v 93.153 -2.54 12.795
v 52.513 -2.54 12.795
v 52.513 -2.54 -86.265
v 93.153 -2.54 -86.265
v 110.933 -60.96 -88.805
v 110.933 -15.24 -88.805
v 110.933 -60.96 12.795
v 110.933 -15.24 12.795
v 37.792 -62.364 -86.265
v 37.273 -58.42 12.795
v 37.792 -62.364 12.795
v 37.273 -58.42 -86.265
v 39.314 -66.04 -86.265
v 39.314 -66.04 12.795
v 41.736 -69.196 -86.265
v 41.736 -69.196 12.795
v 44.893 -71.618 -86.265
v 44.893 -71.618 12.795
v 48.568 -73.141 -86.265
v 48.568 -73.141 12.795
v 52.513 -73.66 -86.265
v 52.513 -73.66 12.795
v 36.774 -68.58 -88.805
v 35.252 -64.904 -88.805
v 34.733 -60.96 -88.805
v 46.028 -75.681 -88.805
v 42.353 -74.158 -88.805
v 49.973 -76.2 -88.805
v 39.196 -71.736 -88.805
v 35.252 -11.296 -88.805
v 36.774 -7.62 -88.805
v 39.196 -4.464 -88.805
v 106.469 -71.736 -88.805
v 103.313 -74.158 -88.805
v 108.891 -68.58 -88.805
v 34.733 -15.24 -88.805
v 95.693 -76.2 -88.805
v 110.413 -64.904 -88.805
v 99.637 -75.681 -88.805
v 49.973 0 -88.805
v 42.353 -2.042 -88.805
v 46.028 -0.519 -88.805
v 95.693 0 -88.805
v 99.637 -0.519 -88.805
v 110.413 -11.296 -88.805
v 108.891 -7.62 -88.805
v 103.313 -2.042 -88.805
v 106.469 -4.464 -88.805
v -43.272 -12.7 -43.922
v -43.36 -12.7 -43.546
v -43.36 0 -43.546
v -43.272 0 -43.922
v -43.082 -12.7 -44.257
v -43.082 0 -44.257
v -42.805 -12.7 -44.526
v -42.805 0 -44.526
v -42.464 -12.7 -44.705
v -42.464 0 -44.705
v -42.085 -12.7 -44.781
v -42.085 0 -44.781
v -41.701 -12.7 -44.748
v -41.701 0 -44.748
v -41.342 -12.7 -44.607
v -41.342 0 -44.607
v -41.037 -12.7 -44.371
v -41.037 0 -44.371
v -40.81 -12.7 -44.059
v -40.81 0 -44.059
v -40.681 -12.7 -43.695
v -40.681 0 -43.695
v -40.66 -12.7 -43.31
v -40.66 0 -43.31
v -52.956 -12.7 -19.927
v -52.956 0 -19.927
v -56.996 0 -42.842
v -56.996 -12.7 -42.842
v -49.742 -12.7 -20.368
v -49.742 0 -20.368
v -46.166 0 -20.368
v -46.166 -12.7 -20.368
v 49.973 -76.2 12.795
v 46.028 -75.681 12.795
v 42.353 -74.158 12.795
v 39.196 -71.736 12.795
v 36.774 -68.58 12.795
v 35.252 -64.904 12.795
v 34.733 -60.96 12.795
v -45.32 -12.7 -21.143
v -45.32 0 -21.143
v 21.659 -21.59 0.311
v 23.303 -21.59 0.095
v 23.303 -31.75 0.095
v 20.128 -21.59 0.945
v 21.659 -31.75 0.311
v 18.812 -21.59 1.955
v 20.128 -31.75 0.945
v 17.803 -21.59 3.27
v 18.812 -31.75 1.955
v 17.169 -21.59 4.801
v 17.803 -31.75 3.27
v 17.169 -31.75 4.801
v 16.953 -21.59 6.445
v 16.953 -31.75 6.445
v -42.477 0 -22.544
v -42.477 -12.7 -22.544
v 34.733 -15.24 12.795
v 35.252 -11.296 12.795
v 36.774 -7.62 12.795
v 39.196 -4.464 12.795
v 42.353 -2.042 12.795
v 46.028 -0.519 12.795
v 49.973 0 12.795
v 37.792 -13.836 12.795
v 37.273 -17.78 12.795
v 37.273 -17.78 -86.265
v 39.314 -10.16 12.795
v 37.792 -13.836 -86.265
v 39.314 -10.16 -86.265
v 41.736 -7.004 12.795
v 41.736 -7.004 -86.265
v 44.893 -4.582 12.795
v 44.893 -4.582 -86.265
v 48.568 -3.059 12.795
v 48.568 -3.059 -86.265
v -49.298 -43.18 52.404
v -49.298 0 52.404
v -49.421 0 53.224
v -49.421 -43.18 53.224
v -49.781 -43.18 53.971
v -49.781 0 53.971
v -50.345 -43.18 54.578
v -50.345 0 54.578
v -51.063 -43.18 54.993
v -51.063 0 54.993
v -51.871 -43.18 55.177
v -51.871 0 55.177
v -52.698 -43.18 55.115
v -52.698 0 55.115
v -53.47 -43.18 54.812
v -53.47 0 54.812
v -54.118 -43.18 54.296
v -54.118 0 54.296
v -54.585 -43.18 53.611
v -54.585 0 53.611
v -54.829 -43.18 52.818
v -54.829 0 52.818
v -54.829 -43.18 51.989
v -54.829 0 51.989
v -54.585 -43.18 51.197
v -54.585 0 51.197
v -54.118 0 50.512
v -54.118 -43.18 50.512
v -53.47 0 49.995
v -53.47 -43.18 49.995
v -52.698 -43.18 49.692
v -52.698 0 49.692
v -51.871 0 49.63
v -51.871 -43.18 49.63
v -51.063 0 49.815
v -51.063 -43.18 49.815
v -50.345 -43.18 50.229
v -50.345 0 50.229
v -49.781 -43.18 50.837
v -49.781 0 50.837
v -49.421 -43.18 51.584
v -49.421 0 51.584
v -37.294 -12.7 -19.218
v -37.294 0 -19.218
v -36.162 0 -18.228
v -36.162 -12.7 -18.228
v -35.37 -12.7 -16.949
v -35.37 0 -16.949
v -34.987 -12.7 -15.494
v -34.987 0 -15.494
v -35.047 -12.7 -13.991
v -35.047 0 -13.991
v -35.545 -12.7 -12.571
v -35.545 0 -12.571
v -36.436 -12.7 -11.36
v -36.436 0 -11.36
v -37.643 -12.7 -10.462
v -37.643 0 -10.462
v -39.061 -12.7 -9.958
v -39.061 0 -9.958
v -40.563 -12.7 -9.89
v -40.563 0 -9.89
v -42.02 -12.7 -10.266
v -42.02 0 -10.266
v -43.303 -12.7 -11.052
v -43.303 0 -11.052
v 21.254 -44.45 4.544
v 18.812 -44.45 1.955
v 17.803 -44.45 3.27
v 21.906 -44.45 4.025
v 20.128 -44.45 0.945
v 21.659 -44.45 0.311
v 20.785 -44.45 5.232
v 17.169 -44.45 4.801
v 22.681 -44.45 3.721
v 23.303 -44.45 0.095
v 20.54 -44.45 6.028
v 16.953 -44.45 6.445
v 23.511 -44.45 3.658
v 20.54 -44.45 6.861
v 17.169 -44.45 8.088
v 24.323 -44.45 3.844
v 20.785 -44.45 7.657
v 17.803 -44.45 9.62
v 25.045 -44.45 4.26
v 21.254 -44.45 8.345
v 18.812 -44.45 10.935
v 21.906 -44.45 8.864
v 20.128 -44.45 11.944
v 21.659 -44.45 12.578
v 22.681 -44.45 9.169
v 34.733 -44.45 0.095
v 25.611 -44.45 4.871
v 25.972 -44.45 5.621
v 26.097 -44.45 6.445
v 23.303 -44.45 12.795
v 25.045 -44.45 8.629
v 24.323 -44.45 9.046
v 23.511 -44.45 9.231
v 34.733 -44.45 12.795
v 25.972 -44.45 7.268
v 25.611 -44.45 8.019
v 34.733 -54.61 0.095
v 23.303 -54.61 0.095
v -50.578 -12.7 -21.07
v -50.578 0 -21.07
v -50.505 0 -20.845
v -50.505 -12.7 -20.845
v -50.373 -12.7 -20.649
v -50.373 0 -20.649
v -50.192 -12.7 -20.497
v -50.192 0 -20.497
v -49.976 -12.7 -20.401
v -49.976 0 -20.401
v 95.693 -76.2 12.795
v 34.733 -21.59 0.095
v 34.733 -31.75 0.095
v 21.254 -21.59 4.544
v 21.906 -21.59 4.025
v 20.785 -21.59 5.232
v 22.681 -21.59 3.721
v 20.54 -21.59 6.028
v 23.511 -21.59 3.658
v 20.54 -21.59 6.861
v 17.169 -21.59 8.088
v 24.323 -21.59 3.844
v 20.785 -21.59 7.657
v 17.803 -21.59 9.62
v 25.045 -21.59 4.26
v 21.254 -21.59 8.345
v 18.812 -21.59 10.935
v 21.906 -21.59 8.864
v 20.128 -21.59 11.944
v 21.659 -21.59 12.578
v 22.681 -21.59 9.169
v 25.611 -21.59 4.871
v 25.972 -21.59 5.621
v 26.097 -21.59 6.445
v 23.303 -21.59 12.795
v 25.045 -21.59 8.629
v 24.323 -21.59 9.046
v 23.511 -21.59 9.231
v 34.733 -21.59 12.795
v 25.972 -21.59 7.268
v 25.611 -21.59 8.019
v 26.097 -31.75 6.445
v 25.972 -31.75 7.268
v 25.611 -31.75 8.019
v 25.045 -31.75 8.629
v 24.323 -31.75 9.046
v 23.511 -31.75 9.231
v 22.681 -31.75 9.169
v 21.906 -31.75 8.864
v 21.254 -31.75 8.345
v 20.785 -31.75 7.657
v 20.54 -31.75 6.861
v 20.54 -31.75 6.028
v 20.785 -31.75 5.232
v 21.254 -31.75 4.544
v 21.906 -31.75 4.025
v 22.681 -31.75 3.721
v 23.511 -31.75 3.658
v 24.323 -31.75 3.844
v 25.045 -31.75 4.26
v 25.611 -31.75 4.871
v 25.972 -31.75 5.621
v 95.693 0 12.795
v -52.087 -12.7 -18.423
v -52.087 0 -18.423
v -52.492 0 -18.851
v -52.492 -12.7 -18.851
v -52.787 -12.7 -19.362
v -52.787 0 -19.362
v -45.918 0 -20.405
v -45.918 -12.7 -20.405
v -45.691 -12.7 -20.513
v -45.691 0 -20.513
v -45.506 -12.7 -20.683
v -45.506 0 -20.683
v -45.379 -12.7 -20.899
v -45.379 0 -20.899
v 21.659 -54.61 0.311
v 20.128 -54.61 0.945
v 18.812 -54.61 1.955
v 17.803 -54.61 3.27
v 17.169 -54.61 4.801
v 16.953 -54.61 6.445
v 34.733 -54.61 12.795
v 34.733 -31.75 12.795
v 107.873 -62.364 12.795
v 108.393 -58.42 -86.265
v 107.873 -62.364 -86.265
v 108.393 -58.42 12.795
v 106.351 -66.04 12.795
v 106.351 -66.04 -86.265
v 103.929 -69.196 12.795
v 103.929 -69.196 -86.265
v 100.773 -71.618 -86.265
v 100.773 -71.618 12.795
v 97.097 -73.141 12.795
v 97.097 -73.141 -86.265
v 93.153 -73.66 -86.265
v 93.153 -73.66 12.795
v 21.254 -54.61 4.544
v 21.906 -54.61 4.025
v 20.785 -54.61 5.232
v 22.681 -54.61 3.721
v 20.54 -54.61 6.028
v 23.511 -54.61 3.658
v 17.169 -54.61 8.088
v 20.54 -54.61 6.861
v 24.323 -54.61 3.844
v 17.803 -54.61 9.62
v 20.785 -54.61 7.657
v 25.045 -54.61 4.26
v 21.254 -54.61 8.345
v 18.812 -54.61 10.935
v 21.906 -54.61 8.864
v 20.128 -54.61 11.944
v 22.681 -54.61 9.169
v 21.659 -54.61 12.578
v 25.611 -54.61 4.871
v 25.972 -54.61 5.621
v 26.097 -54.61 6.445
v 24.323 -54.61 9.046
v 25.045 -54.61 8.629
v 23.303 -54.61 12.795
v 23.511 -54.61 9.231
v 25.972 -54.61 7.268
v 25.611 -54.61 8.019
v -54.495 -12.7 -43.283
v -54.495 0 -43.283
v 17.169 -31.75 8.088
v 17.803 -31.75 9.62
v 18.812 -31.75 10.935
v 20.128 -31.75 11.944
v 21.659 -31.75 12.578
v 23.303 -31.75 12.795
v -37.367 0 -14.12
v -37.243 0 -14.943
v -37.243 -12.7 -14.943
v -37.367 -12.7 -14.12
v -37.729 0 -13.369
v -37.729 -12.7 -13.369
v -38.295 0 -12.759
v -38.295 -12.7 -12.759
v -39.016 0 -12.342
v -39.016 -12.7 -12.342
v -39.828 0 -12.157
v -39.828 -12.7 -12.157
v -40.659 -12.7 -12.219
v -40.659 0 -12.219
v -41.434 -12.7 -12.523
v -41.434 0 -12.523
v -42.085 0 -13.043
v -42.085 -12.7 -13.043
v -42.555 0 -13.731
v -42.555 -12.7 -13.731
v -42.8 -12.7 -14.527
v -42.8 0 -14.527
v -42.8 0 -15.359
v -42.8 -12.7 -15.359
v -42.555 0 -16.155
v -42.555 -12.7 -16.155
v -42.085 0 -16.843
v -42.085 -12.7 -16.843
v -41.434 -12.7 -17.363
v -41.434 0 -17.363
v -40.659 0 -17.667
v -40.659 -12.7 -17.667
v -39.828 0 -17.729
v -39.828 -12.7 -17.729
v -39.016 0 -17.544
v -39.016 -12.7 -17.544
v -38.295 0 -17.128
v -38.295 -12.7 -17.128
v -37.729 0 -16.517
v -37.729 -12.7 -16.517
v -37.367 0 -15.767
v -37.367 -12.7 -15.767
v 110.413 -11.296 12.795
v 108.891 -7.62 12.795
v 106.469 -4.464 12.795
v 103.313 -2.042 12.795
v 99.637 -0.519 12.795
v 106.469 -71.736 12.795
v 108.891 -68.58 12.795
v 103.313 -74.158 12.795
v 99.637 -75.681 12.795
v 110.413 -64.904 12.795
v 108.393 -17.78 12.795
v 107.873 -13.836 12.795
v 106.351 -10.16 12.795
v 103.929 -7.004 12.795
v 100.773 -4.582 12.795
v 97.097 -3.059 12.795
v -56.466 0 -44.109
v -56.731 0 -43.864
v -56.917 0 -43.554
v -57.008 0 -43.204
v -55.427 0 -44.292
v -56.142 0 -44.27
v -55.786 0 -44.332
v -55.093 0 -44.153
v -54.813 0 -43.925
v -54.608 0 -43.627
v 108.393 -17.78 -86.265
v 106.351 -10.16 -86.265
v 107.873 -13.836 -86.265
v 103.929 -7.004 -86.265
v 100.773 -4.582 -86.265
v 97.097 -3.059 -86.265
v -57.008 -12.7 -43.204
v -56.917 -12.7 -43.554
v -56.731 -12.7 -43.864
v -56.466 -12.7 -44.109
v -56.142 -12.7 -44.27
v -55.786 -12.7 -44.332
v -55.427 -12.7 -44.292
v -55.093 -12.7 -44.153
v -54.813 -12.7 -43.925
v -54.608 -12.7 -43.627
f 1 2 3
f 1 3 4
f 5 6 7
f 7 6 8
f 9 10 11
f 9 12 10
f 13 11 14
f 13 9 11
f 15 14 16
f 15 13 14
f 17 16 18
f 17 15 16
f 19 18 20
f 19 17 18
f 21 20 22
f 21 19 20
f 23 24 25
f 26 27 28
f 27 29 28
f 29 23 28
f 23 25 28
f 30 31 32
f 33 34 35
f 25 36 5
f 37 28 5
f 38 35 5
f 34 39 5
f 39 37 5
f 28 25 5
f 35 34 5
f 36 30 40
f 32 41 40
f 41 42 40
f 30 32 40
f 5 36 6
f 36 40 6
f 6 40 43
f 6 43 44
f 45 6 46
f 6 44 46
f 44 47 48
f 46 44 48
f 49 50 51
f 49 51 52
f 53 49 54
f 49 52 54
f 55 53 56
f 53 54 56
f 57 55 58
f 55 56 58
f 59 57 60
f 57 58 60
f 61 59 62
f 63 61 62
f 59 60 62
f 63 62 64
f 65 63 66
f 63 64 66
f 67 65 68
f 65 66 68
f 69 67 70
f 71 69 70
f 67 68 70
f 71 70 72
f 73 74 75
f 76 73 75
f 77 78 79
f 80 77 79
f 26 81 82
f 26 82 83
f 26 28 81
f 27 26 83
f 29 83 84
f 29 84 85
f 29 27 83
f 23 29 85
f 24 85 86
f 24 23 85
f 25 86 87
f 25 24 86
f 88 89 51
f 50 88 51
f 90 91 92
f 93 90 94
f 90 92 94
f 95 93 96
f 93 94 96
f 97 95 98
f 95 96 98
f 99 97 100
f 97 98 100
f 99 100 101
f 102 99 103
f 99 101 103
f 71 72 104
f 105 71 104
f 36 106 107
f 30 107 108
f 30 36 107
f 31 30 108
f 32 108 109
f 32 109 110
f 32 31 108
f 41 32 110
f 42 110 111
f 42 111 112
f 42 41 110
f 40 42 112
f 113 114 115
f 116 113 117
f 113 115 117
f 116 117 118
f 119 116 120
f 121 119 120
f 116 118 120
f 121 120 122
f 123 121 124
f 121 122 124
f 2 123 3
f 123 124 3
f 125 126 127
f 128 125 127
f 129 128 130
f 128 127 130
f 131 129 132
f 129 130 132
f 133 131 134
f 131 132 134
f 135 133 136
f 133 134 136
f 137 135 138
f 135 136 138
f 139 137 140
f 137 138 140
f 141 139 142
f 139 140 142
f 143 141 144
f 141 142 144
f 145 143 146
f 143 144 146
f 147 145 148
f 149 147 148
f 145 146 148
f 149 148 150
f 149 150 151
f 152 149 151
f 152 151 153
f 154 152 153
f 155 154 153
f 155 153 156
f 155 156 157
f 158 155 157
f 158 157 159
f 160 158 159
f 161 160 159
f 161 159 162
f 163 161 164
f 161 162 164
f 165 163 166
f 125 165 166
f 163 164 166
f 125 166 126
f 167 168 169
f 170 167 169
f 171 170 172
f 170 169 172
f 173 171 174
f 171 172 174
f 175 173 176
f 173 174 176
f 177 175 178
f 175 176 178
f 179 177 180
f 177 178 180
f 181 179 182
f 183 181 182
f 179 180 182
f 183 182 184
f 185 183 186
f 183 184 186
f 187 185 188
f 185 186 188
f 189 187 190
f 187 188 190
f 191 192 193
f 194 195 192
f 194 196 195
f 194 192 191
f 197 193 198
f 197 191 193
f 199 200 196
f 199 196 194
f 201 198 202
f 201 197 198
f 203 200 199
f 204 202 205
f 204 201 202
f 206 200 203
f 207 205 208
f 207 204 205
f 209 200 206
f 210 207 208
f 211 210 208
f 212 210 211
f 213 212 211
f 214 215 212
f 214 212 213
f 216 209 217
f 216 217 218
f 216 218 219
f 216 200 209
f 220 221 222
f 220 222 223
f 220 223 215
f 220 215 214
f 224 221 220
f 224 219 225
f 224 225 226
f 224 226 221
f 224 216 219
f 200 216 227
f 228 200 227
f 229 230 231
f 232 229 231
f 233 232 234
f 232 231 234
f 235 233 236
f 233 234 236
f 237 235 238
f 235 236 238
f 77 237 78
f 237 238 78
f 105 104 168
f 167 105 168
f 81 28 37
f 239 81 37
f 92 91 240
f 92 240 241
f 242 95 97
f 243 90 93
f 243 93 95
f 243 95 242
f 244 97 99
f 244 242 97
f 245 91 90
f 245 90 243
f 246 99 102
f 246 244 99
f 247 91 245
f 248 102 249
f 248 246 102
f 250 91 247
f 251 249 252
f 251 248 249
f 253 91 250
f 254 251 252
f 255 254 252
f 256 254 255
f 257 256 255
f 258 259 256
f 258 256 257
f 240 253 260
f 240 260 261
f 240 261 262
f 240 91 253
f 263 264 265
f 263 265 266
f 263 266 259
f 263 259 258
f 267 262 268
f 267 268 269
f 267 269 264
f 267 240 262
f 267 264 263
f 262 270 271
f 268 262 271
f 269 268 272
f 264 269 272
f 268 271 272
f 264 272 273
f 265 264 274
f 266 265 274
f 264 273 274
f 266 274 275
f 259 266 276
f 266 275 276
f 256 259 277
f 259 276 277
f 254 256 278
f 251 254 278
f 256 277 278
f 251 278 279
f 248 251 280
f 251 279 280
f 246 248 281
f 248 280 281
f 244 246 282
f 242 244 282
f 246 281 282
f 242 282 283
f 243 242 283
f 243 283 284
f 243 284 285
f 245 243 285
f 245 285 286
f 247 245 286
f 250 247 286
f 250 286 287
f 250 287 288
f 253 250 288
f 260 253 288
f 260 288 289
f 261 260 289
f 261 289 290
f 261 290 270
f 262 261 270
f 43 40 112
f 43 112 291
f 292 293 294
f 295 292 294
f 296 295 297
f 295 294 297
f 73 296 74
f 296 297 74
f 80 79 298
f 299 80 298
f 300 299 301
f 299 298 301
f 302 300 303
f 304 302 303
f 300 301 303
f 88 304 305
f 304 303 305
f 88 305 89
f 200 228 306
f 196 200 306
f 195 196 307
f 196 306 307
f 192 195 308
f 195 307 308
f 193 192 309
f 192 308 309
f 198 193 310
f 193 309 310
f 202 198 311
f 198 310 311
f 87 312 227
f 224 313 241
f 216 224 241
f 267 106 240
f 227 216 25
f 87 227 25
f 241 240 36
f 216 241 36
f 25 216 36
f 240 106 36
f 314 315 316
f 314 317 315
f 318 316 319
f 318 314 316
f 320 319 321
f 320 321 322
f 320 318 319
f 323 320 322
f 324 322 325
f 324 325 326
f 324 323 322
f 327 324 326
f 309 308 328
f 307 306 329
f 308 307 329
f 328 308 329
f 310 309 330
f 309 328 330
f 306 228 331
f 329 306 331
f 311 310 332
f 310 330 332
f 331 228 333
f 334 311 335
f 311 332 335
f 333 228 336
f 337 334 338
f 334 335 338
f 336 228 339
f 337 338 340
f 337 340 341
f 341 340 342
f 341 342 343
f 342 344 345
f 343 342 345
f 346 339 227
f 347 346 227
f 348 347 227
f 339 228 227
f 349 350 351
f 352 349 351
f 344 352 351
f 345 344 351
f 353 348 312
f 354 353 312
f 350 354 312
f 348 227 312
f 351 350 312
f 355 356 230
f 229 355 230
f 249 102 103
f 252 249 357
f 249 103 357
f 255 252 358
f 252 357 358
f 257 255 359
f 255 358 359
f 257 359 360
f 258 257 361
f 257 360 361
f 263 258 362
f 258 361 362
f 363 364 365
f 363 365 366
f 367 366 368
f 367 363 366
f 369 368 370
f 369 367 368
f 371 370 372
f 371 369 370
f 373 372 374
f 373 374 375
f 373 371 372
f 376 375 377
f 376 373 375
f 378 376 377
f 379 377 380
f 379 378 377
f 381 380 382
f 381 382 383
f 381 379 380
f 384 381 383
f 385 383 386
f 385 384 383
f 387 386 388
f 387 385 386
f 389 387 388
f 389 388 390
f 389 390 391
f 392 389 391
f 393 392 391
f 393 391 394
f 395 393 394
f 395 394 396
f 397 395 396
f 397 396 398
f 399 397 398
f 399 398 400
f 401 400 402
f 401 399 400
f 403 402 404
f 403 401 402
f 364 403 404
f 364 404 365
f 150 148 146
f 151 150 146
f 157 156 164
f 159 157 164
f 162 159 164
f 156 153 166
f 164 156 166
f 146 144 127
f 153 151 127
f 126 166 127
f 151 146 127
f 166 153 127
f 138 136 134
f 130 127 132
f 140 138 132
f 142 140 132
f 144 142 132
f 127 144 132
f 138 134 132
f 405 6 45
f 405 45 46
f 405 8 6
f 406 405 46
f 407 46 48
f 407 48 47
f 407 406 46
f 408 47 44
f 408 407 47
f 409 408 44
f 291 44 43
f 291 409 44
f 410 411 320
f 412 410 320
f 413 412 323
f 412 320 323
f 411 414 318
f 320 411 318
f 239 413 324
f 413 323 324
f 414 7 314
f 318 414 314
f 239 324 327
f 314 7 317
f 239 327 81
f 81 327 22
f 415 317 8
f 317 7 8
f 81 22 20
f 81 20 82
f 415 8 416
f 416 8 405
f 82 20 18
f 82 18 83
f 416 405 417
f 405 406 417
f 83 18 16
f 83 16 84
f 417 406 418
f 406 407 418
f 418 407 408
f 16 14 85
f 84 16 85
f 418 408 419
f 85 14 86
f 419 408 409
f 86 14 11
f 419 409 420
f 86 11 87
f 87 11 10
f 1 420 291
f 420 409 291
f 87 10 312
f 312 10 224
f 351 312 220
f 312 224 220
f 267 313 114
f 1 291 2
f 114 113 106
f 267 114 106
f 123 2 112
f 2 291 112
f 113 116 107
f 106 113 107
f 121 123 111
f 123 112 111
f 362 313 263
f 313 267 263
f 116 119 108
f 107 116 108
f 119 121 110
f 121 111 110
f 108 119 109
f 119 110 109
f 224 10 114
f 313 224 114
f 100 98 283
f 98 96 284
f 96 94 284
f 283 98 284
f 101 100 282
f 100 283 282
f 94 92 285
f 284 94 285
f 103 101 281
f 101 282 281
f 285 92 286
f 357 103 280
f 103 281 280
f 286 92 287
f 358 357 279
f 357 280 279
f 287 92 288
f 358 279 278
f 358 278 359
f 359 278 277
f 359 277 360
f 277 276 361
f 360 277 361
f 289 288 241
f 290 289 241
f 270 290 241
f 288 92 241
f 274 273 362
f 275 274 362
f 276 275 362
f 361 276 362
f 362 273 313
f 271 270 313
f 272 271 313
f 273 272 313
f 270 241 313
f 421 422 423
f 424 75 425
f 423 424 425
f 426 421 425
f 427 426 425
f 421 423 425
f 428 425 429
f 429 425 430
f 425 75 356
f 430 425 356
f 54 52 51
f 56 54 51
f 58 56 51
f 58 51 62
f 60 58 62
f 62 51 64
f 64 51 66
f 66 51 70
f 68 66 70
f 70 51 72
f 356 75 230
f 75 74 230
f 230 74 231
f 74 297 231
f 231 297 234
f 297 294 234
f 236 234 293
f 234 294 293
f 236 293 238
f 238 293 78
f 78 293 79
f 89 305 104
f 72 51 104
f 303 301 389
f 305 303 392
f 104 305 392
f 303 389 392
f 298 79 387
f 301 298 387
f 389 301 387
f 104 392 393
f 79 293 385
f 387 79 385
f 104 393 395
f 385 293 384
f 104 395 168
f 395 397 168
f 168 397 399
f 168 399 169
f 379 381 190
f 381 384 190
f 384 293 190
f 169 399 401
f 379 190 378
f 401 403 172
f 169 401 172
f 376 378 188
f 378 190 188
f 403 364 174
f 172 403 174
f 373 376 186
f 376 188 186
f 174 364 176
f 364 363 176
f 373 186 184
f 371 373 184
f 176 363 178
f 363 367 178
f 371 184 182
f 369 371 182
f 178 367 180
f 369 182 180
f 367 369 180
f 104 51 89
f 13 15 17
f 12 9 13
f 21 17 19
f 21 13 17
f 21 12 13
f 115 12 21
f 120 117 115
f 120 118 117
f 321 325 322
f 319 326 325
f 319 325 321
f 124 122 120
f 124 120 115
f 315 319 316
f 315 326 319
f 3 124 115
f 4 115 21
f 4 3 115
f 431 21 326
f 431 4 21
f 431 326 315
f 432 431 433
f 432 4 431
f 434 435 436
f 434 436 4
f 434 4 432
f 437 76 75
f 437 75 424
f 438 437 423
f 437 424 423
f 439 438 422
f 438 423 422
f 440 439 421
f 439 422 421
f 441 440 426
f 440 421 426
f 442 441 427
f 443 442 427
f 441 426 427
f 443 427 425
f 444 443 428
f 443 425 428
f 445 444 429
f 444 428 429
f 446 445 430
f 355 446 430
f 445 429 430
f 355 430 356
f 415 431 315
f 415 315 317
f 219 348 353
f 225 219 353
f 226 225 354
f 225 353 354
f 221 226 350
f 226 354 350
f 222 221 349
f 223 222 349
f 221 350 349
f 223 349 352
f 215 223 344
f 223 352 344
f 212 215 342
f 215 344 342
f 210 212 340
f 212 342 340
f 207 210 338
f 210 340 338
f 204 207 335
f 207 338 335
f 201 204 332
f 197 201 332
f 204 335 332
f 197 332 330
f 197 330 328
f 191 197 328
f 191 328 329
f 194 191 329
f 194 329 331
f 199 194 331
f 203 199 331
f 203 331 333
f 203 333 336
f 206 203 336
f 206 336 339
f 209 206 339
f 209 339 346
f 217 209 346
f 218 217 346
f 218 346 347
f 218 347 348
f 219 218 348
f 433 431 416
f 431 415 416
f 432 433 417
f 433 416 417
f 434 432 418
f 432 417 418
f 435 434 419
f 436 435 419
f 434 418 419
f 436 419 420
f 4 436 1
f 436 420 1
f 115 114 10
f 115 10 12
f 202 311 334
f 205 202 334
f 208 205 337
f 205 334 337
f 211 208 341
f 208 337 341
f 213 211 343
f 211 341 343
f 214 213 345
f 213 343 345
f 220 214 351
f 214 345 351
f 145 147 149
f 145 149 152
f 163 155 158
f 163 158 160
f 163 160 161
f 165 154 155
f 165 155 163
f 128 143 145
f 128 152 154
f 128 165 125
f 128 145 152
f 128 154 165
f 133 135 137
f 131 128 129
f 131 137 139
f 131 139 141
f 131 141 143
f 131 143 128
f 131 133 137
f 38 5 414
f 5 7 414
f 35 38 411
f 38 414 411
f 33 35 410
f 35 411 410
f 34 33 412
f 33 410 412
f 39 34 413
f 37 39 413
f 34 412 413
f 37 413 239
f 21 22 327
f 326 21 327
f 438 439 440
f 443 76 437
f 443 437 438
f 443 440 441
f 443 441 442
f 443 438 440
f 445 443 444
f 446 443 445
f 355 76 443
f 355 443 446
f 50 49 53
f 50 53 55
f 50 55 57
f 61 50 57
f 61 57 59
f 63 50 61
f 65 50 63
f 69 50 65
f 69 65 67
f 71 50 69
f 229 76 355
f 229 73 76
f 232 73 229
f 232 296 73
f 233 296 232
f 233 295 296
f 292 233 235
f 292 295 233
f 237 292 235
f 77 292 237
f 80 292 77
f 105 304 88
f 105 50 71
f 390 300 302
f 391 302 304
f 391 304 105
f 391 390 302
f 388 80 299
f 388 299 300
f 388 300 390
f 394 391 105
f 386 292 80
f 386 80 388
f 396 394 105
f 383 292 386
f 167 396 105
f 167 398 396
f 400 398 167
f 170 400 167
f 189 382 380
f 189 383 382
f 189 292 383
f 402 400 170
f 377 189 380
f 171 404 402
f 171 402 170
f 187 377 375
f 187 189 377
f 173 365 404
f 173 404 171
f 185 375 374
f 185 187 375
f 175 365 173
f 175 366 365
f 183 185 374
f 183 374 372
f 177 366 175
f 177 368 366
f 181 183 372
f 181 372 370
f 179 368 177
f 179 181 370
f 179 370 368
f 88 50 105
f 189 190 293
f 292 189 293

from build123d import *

# Parameters (mm, degrees)
F0_R      = 2.794
F1_DEPTH  = 12.7
F3_DEPTH  = 76.2
F4_T      = -2.54
F5_R      = 15.24
F6_R      = 15.24
F7_W      = 10.16
F7_H      = 12.7
F8_DEPTH  = 17.78
F10_DEPTH = 33.02
F9_R      = 2.794
F11_DEPTH = 33.02
F12_R     = 2.7813
F13_DEPTH = 43.18


with BuildPart() as f1:
    # F0 (on Front) → F1 (new body)
    with BuildSketch(Plane.XZ):
        with BuildLine():
            Line((-52.9557178239, -19.9272039703), (-56.9962829072, -42.842387268))
            ThreePointArc((-56.9962829072, -42.842387268), (-55.9661104361, -44.3136260292), (-54.4948716749, -43.2834535581))
            Line((-54.4948716749, -43.2834535581), (-50.5779905068, -21.0697165999))
            ThreePointArc((-50.5779905068, -21.0697165999), (-50.2876675436, -20.566862477), (-49.7420388513, -20.3682698741))
            Line((-49.7420388513, -20.3682698741), (-46.1659254268, -20.3682698741))
            ThreePointArc((-46.1659254268, -20.3682698741), (-45.5924523294, -20.5912813649), (-45.3203079908, -21.143135492))
            Line((-45.3203079908, -21.143135492), (-43.3602964284, -43.546170164))
            ThreePointArc((-43.3602964284, -43.546170164), (-41.8919443993, -44.7782638101), (-40.6598507532, -43.309911781))
            Line((-40.6598507532, -43.309911781), (-42.4765913108, -22.5444721875))
            Line((-42.4765913108, -22.5444721875), (-37.2936406402, -19.2184539172))
            ThreePointArc((-37.2936406402, -19.2184539172), (-35.9454842194, -11.9324491853), (-43.3026181586, -11.0515570864))
            Line((-43.3026181586, -11.0515570864), (-52.0869866599, -18.422517456))
            ThreePointArc((-52.0869866599, -18.422517456), (-52.6540106569, -19.0982703415), (-52.9557178239, -19.9272039703))
        make_face()
        with Locations((-40.0372571014, -14.9430628575)):
            Circle(F0_R, mode=Mode.SUBTRACT)
    extrude(amount=F1_DEPTH)


with BuildPart() as f3:
    # F2 (on Front) → F3 (new body)
    with BuildSketch(Plane.XZ):
        Polygon((34.7325472392, 7.2066777061), (34.7325472392, -88.8053222939), (110.9325472392, -88.8053222939), (110.9325472392, 12.7946777061), (34.7325472392, 12.7946777061), align=None)
    extrude(amount=F3_DEPTH)

    # F4
    f4_openings = [f3.faces().sort_by_distance(p)[0] for p in [
        (72.832547, -38.1, 12.794678),
    ]]
    offset(amount=F4_T, openings=f4_openings)

    # F5
    f5_edges = [f3.edges().sort_by_distance(p)[0] for p in [
        (37.272547, -2.54, -36.735322),
        (108.392547, -2.54, -36.735322),
        (37.272547, -73.66, -36.735322),
        (108.392547, -73.66, -36.735322),
    ]]
    fillet(f5_edges, radius=F5_R)

    # F6
    f6_edges = [f3.edges().sort_by_distance(p)[0] for p in [
        (110.932547, 0, -38.005322),
        (110.932547, -76.2, -38.005322),
        (34.732547, 0, -38.005322),
        (34.732547, -76.2, -38.005322),
    ]]
    fillet(f6_edges, radius=F6_R)

    # F7 (on face) → F8 (join)
    with BuildSketch(Plane(origin=(34.7325472392, 0, 0), x_dir=(0, -1, 0), z_dir=(-1, 0, 0))):
        with Locations((26.67, 6.4446777061)):
            Rectangle(F7_W, F7_H)
        with Locations((49.53, 6.4446777061)):
            Rectangle(F7_W, F7_H)
    extrude(amount=F8_DEPTH)

    # F9 (on face) → F10 (cut)
    with BuildSketch(Plane.XZ.offset(54.61)):
        with BuildLine():
            Line((16.9525472392, 0.0946777061), (23.3025472392, 0.0946777061))
            ThreePointArc((23.3025472392, 0.0946777061), (18.8124192105, 1.9545496137), (16.9525472392, 6.444677616))
            Line((16.9525472392, 6.444677616), (16.9525472392, 0.0946777061))
        make_face()
        with BuildLine():
            ThreePointArc((16.9525472392, 6.444677616), (18.8124191468, 10.9348057347), (23.3025472392, 12.7946777061))
            Line((23.3025472392, 12.7946777061), (16.9525472392, 12.7946777061))
            Line((16.9525472392, 12.7946777061), (16.9525472392, 6.444677616))
        make_face()
    extrude(amount=-F10_DEPTH, mode=Mode.SUBTRACT)

    # F9 (on face) → F11 (cut)
    with BuildSketch(Plane.XZ.offset(54.61)):
        with Locations((23.3025472392, 6.4446777061)):
            Circle(F9_R)
    extrude(amount=-F11_DEPTH, mode=Mode.SUBTRACT)


with BuildPart() as f13:
    # F12 (on Front) → F13 (new body)
    with BuildSketch(Plane.XZ):
        with Locations((-52.0791523159, 52.403781563)):
            Circle(F12_R)
    extrude(amount=F13_DEPTH)


solid = Compound([f1.part, f3.part, f13.part])
